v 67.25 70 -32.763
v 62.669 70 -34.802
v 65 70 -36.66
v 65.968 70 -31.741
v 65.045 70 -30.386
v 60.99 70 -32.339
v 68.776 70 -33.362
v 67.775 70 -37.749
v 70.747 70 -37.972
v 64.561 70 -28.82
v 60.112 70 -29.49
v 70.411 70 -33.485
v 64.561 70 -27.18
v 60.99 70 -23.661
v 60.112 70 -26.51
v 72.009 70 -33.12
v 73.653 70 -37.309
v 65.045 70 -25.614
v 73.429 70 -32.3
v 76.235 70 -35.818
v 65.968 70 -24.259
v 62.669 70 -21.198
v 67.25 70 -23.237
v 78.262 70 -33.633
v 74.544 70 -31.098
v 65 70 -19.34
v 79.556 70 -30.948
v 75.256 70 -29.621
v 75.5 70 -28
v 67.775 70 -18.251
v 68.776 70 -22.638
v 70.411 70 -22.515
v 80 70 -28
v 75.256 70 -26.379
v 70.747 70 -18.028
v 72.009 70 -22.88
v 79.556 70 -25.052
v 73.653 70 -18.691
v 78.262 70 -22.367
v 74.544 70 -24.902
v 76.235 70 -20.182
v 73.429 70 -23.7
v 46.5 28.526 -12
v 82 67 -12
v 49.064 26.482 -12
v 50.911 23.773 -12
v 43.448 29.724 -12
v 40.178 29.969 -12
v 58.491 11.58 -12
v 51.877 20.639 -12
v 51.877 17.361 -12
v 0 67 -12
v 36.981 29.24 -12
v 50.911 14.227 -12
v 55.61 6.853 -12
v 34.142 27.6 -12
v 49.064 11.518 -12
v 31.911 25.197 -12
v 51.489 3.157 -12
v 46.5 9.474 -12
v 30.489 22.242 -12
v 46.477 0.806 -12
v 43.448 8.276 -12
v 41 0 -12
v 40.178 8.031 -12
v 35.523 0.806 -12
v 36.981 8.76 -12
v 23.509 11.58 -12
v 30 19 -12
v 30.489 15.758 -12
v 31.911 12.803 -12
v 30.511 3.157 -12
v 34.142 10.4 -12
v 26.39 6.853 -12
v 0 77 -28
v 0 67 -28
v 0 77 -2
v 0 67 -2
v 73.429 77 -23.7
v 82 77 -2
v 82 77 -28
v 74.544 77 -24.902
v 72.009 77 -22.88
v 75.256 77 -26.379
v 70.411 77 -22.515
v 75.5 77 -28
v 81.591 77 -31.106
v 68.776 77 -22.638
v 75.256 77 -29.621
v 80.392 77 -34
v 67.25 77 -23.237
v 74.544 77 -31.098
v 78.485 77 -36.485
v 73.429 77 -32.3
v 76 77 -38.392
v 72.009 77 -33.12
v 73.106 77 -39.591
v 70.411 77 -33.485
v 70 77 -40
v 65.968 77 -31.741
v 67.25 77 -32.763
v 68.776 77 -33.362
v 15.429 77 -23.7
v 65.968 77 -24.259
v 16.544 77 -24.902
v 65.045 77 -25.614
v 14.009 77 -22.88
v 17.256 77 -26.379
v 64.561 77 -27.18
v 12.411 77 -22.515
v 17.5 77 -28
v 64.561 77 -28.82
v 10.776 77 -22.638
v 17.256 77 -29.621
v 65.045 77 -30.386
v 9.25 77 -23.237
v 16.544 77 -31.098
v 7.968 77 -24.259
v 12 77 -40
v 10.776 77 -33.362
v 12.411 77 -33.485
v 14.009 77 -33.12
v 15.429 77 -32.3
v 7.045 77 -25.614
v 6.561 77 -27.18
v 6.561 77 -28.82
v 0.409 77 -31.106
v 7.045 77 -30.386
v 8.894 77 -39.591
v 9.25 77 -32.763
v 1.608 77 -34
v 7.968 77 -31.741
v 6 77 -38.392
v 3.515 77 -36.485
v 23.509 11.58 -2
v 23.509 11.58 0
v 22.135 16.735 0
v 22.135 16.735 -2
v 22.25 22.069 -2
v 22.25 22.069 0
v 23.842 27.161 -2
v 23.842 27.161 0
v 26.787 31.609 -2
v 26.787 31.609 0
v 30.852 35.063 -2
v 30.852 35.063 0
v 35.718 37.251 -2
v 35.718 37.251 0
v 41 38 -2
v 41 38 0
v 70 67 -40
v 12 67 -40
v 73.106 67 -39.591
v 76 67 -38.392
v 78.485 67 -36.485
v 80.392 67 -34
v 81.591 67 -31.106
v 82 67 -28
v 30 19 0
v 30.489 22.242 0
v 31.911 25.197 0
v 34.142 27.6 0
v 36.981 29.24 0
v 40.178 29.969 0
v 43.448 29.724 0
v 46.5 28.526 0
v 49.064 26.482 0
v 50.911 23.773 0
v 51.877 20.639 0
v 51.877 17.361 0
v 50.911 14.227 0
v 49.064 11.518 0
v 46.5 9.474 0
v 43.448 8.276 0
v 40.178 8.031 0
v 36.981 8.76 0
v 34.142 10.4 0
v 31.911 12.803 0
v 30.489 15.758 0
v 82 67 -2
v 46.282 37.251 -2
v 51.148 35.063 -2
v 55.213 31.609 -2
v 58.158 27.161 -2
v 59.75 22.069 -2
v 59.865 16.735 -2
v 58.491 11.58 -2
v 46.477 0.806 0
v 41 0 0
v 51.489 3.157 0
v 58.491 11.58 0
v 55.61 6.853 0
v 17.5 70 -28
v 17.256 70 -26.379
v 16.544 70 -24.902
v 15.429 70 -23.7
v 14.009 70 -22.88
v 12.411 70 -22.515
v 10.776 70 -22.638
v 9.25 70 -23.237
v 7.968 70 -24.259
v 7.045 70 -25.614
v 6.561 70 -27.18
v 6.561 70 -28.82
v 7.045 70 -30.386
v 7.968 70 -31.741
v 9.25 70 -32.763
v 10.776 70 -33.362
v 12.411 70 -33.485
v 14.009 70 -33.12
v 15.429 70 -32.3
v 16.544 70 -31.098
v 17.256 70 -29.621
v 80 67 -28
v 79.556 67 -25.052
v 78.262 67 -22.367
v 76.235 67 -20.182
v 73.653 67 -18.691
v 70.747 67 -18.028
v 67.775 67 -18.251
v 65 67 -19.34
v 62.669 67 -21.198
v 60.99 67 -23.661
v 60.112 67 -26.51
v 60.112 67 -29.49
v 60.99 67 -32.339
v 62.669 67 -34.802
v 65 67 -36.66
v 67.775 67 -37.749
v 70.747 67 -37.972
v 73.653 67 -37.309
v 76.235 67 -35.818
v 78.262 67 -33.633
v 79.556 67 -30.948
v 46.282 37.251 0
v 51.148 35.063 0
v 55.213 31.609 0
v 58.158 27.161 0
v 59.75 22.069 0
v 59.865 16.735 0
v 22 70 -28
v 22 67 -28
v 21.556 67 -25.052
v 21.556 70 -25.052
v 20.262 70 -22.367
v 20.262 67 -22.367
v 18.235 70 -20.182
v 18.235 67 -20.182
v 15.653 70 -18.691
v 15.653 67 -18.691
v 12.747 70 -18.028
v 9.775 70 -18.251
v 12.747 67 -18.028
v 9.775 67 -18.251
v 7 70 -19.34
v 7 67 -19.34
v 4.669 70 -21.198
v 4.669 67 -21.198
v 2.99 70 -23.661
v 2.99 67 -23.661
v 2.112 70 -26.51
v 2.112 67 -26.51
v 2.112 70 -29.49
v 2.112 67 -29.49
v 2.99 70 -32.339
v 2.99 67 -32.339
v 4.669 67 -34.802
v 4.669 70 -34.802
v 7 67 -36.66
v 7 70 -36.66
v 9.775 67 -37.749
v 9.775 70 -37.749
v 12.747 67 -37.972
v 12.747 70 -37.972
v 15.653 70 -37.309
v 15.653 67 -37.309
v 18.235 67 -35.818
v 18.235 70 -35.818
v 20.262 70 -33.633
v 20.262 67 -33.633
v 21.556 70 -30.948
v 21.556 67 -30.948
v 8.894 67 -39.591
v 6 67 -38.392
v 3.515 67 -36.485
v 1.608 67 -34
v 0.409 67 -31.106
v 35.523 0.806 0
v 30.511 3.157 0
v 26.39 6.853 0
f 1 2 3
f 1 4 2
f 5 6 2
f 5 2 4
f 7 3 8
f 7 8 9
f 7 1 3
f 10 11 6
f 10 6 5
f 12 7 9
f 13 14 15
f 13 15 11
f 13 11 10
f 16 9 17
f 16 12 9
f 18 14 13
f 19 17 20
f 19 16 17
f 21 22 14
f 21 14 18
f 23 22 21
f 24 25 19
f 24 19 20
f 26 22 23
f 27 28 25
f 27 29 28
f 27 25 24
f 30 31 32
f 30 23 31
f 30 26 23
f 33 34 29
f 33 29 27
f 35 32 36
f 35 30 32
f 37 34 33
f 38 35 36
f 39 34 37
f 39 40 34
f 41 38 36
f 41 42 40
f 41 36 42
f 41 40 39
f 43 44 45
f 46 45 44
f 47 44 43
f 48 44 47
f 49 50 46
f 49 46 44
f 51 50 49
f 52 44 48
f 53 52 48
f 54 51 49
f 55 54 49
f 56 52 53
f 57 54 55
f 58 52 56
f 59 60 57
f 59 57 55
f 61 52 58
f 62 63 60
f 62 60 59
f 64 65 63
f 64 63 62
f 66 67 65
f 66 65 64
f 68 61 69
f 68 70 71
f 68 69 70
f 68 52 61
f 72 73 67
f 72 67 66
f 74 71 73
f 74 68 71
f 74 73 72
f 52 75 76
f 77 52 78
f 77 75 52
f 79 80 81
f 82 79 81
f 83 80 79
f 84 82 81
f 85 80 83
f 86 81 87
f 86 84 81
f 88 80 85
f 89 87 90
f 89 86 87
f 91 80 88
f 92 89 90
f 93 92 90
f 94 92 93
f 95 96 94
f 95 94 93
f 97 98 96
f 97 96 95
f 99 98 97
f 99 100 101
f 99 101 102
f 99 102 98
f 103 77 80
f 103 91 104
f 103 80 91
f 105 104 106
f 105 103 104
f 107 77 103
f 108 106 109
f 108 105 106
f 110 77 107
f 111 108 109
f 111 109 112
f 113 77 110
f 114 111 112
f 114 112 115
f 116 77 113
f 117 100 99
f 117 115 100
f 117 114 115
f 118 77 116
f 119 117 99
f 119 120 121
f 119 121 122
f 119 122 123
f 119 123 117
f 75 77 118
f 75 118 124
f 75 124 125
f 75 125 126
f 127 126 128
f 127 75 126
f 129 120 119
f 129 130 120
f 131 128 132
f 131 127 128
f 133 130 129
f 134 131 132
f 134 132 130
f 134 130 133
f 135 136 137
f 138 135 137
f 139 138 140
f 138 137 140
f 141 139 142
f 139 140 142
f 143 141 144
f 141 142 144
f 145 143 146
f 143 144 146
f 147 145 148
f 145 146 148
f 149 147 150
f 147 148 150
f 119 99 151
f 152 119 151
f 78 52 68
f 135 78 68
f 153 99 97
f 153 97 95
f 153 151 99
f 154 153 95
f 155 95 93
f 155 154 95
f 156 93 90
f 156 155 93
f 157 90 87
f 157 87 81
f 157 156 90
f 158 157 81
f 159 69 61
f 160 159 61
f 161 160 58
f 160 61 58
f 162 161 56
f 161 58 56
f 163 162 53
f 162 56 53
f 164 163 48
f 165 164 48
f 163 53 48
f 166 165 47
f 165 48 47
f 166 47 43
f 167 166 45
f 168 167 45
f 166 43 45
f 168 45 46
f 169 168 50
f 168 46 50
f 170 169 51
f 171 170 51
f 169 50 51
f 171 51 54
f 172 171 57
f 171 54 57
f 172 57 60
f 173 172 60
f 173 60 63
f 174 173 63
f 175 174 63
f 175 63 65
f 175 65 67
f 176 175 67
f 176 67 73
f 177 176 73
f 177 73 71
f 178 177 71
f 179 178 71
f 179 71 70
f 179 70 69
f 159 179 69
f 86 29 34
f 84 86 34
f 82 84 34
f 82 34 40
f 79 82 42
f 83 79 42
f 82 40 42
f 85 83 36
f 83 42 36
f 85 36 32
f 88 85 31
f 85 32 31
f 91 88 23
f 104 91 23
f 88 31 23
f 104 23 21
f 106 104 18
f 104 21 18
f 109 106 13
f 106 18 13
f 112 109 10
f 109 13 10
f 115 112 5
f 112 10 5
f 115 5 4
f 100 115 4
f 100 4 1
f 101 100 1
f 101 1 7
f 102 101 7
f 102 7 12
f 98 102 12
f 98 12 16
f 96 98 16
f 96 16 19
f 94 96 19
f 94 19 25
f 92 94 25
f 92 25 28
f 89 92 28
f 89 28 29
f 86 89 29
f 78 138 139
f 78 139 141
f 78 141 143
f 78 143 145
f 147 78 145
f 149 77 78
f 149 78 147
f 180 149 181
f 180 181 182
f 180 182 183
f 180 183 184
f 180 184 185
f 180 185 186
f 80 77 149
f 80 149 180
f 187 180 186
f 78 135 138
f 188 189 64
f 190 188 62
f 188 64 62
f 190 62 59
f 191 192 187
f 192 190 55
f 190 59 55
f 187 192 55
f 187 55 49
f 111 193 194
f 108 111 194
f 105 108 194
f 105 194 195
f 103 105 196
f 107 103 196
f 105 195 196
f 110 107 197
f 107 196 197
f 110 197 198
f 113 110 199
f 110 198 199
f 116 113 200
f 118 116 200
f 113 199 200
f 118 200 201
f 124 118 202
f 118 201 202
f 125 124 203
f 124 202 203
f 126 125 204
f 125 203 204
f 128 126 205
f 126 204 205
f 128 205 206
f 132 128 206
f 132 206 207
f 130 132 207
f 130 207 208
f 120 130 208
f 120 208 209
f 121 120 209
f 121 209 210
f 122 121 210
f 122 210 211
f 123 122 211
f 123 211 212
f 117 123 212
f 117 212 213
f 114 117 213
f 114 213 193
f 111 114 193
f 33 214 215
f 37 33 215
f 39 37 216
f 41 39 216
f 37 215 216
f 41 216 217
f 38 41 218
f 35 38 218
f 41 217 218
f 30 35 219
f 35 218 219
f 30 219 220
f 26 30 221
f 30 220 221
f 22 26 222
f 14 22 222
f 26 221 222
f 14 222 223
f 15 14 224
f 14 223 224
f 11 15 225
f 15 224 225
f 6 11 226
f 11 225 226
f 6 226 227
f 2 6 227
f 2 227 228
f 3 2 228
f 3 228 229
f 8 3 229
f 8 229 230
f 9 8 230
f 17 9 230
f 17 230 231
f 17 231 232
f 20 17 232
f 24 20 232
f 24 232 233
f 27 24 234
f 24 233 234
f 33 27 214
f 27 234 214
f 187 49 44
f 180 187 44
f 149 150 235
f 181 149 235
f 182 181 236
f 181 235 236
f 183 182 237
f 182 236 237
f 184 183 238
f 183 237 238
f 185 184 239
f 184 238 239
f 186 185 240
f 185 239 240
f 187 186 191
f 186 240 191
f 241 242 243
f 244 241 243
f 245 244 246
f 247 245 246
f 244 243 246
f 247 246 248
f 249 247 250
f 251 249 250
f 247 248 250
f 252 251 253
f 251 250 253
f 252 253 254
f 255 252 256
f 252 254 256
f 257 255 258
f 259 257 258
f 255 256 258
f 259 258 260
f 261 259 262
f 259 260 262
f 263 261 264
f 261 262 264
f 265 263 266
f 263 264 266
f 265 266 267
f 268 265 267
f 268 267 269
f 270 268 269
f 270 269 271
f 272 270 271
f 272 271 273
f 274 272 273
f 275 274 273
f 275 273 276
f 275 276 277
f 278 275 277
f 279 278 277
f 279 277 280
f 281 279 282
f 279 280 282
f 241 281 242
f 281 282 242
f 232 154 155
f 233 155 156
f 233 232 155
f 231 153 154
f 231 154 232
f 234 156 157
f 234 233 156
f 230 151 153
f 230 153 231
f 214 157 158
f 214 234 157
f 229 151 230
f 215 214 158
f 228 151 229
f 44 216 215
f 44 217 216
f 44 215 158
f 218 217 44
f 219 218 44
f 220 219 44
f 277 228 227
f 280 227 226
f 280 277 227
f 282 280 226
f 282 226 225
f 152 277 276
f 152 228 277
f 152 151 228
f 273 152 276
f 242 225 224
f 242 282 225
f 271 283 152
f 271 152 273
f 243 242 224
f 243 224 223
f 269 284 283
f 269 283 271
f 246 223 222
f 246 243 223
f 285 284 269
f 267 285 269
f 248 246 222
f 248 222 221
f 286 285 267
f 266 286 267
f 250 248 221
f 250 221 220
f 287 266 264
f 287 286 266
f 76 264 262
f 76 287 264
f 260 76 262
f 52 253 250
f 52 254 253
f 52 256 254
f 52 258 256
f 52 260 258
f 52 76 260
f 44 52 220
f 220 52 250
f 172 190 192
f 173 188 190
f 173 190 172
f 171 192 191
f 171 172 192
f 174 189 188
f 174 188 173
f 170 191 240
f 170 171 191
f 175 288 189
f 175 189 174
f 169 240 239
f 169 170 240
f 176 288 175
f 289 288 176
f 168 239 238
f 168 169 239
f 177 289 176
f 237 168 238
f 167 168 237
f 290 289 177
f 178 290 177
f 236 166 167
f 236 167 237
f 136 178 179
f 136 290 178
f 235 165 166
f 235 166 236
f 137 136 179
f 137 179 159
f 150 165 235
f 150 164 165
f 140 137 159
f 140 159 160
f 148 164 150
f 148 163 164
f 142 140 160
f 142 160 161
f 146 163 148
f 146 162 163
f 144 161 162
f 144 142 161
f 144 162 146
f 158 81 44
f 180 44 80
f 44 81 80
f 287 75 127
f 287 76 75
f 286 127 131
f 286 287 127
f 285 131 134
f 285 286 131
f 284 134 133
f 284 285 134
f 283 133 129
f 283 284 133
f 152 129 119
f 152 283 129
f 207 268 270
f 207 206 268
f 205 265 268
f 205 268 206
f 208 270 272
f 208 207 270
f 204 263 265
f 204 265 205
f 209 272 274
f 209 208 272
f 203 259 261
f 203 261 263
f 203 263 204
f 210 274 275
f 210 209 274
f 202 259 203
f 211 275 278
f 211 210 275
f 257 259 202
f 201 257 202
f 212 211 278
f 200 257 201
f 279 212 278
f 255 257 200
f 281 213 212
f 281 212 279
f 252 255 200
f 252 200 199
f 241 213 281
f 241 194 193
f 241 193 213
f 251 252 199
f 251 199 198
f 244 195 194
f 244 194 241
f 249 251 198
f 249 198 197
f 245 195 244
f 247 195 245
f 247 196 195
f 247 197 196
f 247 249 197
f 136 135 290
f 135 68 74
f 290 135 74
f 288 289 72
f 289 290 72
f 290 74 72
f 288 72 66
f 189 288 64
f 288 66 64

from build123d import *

# Parameters (mm, degrees)
SALIENTE_EXTRUIR1_DEPTH = 82
CORTAR_EXTRUIR1_DEPTH   = 82
CROQUIS3_R              = 11
CORTAR_EXTRUIR2_DEPTH   = 82
CORTAR_EXTRUIR4_DEPTH   = 2
REDONDEO1_R             = 12
REDONDEO2_R             = 12
CROQUIS7_R              = 10
CORTAR_EXTRUIR6_DEPTH   = 3
CROQUIS8_R              = 5.5
CORTAR_EXTRUIR7_DEPTH   = 11


with BuildPart() as part:
    # Croquis1 → Saliente-Extruir1 (new body)
    with BuildSketch(Plane(origin=(0, 0, 0), x_dir=(0, 0, -1), z_dir=(1, 0, 0))):
        Polygon((0, 0), (0, 38), (2, 38), (2, 77), (40, 77), (40, 67), (12, 67), (12, 0), align=None)
    extrude(amount=SALIENTE_EXTRUIR1_DEPTH)

    # Croquis2 → Cortar-Extruir1 (cut)
    with BuildSketch(Plane(origin=(0, 0, -12), x_dir=(-1, 0, 0), z_dir=(0, 0, -1))):
        with BuildLine():
            Line((-82, 0), (-41, 0))
            ThreePointArc((-41, 0), (-51.488696893, 3.157423269), (-58.491366878, 11.580290792))
            Line((-58.491366878, 11.580290792), (-82, 67))
            Line((-82, 67), (-82, 0))
        make_face()
        with BuildLine():
            Line((0, 0), (0, 67))
            Line((0, 67), (-23.508633122, 11.580290792))
            ThreePointArc((-23.508633122, 11.580290792), (-30.511303107, 3.157423269), (-41, 0))
            Line((-41, 0), (0, 0))
        make_face()
    extrude(amount=-CORTAR_EXTRUIR1_DEPTH, mode=Mode.SUBTRACT)

    # Croquis3 → Cortar-Extruir2 (cut)
    with BuildSketch(Plane(origin=(0, 0, -12), x_dir=(-1, 0, 0), z_dir=(0, 0, -1))):
        with Locations((-41, 19)):
            Circle(CROQUIS3_R)
    extrude(amount=-CORTAR_EXTRUIR2_DEPTH, mode=Mode.SUBTRACT)

    # Croquis5 → Cortar-Extruir4 (cut)
    with BuildSketch(Plane.XY):
        with BuildLine():
            ThreePointArc((23.508633122, 11.580290792), (25.157423269, 29.488696893), (41, 38))
            Line((41, 38), (12.301586751, 38))
            Line((12.301586751, 38), (23.508633122, 11.580290792))
        make_face()
        with BuildLine():
            ThreePointArc((41, 38), (56.842576731, 29.488696893), (58.491366878, 11.580290792))
            Line((58.491366878, 11.580290792), (69.698413249, 38))
            Line((69.698413249, 38), (41, 38))
        make_face()
    extrude(amount=-CORTAR_EXTRUIR4_DEPTH, mode=Mode.SUBTRACT)

    # Redondeo1
    redondeo1_edges = [part.edges().sort_by_distance(p)[0] for p in [
        (0, 72, -40),
    ]]
    fillet(redondeo1_edges, radius=REDONDEO1_R)

    # Redondeo2
    redondeo2_edges = [part.edges().sort_by_distance(p)[0] for p in [
        (82, 72, -40),
    ]]
    fillet(redondeo2_edges, radius=REDONDEO2_R)

    # Croquis7 → Cortar-Extruir6 (cut)
    with BuildSketch(Plane.XZ.offset(-67)):
        with Locations((12, -28)):
            Circle(CROQUIS7_R)
        with Locations((70, -28)):
            Circle(CROQUIS7_R)
    extrude(amount=-CORTAR_EXTRUIR6_DEPTH, mode=Mode.SUBTRACT)

    # Croquis8 → Cortar-Extruir7 (cut, through all)
    with BuildSketch(Plane.XZ.offset(-67)):
        with Locations((12, -28)):
            Circle(CROQUIS8_R)
        with Locations((70, -28)):
            Circle(CROQUIS8_R)
    extrude(amount=-CORTAR_EXTRUIR7_DEPTH, mode=Mode.SUBTRACT)


solid = part.part
